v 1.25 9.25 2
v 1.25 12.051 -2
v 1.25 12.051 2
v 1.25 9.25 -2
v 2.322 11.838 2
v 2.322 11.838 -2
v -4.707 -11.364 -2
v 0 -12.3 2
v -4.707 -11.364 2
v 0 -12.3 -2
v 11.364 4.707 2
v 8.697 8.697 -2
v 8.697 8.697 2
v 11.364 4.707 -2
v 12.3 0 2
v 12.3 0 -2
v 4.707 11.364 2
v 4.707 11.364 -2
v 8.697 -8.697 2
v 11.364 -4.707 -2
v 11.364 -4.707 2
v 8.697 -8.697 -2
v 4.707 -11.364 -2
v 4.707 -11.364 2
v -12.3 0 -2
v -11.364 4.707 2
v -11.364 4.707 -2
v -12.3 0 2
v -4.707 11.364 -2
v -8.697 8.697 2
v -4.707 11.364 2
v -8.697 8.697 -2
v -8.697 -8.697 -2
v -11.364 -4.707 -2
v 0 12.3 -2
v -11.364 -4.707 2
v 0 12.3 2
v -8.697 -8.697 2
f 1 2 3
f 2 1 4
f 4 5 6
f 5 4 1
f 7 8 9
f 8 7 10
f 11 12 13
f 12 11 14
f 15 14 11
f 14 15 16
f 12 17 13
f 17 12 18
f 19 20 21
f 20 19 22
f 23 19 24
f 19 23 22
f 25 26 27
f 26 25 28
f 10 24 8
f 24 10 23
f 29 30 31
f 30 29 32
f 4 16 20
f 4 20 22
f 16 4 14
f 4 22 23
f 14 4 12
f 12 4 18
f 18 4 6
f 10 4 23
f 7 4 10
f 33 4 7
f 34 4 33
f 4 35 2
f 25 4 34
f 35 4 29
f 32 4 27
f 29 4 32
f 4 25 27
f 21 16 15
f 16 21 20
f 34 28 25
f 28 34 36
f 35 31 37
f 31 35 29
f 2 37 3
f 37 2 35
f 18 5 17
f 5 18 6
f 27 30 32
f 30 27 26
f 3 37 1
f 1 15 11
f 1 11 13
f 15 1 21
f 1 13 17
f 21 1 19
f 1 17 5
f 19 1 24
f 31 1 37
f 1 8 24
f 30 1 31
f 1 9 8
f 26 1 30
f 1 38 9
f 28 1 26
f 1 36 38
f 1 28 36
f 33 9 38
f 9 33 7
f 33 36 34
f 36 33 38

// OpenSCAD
difference() {
  cylinder($fn=16, h = 4, r = 12.3, center = true);

 translate([4, 12.0, 0]) rotate(a=[0, 0, -90])
   difference() {
     cube(size = [5.5, 5.5, 10], center=true);
     translate([2.75, 2.75, 0]) cylinder($fn = 8, h = 11, r1 = 5.5, r2 = 5.5, center = true);
   }
}
